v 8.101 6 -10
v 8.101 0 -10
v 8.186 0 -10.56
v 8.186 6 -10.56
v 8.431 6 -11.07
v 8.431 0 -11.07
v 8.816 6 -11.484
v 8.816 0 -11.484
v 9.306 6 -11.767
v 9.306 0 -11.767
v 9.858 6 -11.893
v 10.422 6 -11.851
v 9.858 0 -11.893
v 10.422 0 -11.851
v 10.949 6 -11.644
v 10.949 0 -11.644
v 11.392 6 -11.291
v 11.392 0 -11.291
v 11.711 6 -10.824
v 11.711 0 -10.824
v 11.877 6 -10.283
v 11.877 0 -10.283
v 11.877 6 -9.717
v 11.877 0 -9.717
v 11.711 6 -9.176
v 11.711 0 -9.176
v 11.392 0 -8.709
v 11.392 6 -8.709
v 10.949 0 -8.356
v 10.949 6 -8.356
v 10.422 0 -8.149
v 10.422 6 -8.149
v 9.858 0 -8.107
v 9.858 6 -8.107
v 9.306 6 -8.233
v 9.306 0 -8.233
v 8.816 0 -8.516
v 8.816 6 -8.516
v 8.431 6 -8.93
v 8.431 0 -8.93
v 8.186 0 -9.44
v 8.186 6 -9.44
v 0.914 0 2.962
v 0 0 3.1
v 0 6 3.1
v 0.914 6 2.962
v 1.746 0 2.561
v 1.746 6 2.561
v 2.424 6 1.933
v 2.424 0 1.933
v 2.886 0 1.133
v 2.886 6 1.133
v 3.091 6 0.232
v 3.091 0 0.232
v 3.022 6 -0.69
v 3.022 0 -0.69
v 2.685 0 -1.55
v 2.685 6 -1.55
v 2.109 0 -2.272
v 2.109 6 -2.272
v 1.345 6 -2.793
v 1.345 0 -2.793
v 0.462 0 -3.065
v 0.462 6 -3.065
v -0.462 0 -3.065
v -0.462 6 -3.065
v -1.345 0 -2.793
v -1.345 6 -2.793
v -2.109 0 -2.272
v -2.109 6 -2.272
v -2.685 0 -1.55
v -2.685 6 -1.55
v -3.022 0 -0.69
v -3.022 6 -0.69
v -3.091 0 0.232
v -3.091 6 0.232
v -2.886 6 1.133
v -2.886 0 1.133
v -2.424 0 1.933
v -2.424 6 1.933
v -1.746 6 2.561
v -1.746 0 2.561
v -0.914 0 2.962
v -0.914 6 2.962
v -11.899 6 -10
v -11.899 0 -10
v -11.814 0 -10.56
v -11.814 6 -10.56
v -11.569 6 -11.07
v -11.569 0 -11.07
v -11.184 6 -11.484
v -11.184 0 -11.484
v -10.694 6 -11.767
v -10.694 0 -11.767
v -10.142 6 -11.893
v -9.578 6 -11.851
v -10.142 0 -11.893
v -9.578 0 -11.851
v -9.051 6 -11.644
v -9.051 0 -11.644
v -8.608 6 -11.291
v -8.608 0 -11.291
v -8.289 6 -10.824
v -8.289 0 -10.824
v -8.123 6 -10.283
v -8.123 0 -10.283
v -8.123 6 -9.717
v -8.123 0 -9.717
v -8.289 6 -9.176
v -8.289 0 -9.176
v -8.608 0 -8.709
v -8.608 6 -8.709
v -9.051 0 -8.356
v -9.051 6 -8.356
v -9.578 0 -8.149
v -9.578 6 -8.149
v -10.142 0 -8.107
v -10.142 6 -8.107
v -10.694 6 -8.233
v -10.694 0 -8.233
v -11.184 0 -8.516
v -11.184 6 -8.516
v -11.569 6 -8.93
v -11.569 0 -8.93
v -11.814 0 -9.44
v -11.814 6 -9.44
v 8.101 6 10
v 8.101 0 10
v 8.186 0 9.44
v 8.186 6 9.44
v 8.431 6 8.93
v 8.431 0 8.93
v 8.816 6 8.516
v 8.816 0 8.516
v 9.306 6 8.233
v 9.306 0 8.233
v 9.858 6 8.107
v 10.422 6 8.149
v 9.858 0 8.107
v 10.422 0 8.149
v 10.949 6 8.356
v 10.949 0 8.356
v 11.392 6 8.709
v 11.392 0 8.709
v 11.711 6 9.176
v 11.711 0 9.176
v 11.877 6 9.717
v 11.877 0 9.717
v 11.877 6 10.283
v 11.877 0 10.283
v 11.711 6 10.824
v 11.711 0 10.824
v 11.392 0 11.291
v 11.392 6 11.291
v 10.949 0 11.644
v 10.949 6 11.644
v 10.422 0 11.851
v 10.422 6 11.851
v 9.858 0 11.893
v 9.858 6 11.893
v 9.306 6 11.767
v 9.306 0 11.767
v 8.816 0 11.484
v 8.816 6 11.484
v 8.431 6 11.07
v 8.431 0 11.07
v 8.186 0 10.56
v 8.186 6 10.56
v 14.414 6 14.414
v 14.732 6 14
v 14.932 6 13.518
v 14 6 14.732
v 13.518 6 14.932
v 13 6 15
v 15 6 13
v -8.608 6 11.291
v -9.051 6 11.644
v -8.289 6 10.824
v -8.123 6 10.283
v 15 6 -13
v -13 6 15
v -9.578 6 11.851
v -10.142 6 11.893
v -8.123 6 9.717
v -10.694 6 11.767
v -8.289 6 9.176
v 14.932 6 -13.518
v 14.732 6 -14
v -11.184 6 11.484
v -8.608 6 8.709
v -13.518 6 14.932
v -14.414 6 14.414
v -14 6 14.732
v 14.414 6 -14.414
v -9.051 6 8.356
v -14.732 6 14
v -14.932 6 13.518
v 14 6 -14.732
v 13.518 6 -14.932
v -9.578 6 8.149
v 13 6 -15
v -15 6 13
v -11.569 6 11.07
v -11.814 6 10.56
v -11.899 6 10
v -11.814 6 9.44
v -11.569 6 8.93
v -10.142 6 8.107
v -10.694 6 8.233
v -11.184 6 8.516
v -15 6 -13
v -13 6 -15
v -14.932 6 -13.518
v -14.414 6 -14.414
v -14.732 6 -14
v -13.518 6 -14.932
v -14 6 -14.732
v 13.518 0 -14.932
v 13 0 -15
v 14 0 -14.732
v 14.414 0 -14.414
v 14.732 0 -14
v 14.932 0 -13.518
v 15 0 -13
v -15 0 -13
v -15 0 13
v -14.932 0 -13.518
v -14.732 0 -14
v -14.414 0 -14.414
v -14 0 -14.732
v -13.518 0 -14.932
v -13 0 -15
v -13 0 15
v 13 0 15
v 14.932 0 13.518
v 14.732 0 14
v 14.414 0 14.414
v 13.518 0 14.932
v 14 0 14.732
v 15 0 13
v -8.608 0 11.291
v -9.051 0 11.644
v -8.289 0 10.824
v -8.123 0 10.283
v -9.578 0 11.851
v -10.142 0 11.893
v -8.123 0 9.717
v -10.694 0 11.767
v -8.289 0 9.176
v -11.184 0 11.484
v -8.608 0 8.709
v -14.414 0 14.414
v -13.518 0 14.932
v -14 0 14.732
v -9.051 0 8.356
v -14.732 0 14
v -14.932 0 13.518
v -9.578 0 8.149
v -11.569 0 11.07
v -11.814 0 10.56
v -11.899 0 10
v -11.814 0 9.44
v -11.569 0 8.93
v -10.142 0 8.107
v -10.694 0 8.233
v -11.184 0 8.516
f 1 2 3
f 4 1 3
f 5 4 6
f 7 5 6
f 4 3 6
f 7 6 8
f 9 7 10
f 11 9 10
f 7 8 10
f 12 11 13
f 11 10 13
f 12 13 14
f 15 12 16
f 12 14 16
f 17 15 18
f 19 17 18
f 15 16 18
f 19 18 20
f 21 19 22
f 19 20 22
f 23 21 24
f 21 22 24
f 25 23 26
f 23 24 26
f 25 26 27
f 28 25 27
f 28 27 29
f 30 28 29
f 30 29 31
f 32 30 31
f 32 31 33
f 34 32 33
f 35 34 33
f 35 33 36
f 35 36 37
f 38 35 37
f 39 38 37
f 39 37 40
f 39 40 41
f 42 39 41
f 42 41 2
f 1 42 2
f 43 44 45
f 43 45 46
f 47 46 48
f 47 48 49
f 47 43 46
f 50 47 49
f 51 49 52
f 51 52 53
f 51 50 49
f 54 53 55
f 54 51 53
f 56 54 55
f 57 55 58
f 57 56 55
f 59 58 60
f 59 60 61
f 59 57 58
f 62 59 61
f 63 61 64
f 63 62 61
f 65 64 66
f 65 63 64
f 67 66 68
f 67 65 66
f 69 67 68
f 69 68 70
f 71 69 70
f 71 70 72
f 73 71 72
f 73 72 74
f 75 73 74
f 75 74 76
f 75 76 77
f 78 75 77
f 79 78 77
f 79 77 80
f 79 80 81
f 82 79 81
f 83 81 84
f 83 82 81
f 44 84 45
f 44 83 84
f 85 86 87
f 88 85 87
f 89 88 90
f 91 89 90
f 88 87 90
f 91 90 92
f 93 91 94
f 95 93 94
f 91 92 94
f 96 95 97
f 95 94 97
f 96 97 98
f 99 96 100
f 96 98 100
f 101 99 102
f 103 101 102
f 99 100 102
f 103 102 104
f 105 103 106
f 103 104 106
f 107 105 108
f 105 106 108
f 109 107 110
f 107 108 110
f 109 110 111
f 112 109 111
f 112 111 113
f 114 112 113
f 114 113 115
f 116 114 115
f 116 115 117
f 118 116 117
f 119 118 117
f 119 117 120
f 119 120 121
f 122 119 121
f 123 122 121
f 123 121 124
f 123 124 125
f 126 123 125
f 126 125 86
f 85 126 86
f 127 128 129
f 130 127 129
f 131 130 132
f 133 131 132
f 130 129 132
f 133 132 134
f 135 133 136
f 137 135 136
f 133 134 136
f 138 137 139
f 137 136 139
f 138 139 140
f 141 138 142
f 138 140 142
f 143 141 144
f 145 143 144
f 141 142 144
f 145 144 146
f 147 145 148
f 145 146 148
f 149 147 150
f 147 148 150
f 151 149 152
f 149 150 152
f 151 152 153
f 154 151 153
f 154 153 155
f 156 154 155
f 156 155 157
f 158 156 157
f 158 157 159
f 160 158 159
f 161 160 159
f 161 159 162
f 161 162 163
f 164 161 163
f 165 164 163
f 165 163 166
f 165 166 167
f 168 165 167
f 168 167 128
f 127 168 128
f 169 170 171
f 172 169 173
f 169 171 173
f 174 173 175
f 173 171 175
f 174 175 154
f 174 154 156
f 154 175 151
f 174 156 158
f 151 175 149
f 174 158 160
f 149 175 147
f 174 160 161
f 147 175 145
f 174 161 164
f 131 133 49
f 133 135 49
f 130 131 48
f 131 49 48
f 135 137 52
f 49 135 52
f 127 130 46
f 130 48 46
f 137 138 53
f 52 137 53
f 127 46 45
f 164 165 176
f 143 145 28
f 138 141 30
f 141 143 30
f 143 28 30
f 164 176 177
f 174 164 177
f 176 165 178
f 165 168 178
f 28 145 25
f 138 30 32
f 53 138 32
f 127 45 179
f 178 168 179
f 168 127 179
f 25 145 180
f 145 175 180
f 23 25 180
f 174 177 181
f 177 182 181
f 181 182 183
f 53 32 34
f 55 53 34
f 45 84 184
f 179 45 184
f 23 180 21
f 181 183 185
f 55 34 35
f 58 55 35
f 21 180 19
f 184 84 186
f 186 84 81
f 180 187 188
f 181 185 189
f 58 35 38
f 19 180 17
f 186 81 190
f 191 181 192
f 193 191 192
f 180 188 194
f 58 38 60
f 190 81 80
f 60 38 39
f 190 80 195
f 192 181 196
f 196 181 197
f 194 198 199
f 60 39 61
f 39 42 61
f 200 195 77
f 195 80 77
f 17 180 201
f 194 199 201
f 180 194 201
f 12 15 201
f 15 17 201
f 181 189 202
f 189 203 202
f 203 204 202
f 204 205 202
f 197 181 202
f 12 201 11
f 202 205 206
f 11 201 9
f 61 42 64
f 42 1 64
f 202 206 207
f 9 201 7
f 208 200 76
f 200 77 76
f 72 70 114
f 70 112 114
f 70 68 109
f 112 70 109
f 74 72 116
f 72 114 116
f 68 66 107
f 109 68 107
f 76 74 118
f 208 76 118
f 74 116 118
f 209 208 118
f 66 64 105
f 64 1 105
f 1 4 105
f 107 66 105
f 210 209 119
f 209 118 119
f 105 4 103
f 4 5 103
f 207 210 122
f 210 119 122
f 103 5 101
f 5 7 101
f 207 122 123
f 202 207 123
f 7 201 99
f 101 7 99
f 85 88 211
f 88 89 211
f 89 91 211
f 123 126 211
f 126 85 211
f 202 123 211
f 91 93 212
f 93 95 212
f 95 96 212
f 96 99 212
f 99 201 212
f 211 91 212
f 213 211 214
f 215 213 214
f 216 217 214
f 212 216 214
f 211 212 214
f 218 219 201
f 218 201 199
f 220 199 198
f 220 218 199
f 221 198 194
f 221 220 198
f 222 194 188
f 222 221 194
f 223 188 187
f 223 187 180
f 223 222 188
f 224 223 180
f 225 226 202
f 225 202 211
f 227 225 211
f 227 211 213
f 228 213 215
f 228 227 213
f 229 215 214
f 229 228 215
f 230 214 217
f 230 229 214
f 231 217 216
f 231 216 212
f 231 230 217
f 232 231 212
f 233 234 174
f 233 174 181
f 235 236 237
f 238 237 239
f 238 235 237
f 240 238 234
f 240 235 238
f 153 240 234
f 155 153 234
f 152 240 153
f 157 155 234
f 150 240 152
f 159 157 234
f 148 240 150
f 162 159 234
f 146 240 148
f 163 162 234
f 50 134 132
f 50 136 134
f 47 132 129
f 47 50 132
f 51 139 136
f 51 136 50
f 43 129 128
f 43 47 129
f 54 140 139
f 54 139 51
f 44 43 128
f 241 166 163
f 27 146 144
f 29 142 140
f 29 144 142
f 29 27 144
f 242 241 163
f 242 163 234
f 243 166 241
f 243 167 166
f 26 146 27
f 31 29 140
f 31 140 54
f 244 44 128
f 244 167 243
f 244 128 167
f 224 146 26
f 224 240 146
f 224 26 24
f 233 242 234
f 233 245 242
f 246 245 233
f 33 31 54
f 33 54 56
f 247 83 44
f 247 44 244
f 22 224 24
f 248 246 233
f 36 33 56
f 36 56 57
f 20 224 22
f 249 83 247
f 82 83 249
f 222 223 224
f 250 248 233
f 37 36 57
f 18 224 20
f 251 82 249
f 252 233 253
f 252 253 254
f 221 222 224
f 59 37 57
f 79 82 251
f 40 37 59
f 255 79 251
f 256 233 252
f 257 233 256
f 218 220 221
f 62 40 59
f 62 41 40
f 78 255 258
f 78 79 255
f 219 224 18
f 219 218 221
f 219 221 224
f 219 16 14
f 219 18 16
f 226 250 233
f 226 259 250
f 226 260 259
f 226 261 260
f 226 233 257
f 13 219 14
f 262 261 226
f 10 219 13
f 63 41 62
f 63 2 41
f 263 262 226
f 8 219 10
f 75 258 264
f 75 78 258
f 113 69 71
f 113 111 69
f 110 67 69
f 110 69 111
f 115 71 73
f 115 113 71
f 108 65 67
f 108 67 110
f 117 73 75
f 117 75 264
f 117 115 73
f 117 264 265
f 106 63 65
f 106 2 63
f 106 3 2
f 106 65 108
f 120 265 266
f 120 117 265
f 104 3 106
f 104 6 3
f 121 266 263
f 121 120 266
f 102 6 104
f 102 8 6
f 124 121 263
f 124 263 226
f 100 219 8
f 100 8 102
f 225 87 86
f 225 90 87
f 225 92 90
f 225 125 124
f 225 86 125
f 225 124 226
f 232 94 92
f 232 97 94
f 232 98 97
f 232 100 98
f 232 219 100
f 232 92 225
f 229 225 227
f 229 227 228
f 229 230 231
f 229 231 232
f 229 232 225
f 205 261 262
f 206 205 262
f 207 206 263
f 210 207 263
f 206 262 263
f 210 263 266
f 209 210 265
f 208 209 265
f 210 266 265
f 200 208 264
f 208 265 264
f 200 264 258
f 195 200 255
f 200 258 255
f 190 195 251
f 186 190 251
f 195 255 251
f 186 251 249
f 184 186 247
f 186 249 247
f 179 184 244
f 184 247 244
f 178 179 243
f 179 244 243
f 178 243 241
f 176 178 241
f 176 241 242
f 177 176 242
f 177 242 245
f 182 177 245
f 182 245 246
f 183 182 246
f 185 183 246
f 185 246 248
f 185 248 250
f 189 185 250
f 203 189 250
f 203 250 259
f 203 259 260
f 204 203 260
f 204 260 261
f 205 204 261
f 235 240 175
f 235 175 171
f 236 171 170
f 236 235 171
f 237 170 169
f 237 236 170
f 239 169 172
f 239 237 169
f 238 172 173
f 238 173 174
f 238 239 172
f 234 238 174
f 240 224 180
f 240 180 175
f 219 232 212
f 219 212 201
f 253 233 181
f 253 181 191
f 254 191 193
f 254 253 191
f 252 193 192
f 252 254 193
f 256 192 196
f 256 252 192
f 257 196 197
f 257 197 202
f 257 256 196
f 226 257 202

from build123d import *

# Parameters (mm, degrees)
SKETCH1_R             = 3.1
BOSS_EXTRUDE1_DEPTH   = 6
F_6_CLEARANCE_HOLE1_D = 3.7973


with BuildPart() as part:
    # Sketch1 → Boss-Extrude1 (new body)
    with BuildSketch(Plane(origin=(0, 0, 0), x_dir=(1, 0, 0), z_dir=(0, 1, 0))):
        with BuildLine():
            Line((-13, 15), (13, 15))
            ThreePointArc((13, 15), (14.414213562, 14.414213562), (15, 13))
            Line((15, 13), (15, -13))
            ThreePointArc((15, -13), (14.414213562, -14.414213562), (13, -15))
            Line((13, -15), (-13, -15))
            ThreePointArc((-13, -15), (-14.414213562, -14.414213562), (-15, -13))
            Line((-15, -13), (-15, 13))
            ThreePointArc((-15, 13), (-14.414213562, 14.414213562), (-13, 15))
        make_face()
        with Locations(Location((0, 0, 0), (0, 0, 270))):
            Circle(SKETCH1_R, mode=Mode.SUBTRACT)
    extrude(amount=BOSS_EXTRUDE1_DEPTH)

    # #6 Clearance Hole1 (through all)
    with Locations(Plane(origin=(0, 6, 0), x_dir=(1, 0, 0), z_dir=(0, 1, 0))):
        with Locations((-10, 10), (10, 10), (-10, -10), (10, -10)):
            Hole(F_6_CLEARANCE_HOLE1_D / 2)


solid = part.part
